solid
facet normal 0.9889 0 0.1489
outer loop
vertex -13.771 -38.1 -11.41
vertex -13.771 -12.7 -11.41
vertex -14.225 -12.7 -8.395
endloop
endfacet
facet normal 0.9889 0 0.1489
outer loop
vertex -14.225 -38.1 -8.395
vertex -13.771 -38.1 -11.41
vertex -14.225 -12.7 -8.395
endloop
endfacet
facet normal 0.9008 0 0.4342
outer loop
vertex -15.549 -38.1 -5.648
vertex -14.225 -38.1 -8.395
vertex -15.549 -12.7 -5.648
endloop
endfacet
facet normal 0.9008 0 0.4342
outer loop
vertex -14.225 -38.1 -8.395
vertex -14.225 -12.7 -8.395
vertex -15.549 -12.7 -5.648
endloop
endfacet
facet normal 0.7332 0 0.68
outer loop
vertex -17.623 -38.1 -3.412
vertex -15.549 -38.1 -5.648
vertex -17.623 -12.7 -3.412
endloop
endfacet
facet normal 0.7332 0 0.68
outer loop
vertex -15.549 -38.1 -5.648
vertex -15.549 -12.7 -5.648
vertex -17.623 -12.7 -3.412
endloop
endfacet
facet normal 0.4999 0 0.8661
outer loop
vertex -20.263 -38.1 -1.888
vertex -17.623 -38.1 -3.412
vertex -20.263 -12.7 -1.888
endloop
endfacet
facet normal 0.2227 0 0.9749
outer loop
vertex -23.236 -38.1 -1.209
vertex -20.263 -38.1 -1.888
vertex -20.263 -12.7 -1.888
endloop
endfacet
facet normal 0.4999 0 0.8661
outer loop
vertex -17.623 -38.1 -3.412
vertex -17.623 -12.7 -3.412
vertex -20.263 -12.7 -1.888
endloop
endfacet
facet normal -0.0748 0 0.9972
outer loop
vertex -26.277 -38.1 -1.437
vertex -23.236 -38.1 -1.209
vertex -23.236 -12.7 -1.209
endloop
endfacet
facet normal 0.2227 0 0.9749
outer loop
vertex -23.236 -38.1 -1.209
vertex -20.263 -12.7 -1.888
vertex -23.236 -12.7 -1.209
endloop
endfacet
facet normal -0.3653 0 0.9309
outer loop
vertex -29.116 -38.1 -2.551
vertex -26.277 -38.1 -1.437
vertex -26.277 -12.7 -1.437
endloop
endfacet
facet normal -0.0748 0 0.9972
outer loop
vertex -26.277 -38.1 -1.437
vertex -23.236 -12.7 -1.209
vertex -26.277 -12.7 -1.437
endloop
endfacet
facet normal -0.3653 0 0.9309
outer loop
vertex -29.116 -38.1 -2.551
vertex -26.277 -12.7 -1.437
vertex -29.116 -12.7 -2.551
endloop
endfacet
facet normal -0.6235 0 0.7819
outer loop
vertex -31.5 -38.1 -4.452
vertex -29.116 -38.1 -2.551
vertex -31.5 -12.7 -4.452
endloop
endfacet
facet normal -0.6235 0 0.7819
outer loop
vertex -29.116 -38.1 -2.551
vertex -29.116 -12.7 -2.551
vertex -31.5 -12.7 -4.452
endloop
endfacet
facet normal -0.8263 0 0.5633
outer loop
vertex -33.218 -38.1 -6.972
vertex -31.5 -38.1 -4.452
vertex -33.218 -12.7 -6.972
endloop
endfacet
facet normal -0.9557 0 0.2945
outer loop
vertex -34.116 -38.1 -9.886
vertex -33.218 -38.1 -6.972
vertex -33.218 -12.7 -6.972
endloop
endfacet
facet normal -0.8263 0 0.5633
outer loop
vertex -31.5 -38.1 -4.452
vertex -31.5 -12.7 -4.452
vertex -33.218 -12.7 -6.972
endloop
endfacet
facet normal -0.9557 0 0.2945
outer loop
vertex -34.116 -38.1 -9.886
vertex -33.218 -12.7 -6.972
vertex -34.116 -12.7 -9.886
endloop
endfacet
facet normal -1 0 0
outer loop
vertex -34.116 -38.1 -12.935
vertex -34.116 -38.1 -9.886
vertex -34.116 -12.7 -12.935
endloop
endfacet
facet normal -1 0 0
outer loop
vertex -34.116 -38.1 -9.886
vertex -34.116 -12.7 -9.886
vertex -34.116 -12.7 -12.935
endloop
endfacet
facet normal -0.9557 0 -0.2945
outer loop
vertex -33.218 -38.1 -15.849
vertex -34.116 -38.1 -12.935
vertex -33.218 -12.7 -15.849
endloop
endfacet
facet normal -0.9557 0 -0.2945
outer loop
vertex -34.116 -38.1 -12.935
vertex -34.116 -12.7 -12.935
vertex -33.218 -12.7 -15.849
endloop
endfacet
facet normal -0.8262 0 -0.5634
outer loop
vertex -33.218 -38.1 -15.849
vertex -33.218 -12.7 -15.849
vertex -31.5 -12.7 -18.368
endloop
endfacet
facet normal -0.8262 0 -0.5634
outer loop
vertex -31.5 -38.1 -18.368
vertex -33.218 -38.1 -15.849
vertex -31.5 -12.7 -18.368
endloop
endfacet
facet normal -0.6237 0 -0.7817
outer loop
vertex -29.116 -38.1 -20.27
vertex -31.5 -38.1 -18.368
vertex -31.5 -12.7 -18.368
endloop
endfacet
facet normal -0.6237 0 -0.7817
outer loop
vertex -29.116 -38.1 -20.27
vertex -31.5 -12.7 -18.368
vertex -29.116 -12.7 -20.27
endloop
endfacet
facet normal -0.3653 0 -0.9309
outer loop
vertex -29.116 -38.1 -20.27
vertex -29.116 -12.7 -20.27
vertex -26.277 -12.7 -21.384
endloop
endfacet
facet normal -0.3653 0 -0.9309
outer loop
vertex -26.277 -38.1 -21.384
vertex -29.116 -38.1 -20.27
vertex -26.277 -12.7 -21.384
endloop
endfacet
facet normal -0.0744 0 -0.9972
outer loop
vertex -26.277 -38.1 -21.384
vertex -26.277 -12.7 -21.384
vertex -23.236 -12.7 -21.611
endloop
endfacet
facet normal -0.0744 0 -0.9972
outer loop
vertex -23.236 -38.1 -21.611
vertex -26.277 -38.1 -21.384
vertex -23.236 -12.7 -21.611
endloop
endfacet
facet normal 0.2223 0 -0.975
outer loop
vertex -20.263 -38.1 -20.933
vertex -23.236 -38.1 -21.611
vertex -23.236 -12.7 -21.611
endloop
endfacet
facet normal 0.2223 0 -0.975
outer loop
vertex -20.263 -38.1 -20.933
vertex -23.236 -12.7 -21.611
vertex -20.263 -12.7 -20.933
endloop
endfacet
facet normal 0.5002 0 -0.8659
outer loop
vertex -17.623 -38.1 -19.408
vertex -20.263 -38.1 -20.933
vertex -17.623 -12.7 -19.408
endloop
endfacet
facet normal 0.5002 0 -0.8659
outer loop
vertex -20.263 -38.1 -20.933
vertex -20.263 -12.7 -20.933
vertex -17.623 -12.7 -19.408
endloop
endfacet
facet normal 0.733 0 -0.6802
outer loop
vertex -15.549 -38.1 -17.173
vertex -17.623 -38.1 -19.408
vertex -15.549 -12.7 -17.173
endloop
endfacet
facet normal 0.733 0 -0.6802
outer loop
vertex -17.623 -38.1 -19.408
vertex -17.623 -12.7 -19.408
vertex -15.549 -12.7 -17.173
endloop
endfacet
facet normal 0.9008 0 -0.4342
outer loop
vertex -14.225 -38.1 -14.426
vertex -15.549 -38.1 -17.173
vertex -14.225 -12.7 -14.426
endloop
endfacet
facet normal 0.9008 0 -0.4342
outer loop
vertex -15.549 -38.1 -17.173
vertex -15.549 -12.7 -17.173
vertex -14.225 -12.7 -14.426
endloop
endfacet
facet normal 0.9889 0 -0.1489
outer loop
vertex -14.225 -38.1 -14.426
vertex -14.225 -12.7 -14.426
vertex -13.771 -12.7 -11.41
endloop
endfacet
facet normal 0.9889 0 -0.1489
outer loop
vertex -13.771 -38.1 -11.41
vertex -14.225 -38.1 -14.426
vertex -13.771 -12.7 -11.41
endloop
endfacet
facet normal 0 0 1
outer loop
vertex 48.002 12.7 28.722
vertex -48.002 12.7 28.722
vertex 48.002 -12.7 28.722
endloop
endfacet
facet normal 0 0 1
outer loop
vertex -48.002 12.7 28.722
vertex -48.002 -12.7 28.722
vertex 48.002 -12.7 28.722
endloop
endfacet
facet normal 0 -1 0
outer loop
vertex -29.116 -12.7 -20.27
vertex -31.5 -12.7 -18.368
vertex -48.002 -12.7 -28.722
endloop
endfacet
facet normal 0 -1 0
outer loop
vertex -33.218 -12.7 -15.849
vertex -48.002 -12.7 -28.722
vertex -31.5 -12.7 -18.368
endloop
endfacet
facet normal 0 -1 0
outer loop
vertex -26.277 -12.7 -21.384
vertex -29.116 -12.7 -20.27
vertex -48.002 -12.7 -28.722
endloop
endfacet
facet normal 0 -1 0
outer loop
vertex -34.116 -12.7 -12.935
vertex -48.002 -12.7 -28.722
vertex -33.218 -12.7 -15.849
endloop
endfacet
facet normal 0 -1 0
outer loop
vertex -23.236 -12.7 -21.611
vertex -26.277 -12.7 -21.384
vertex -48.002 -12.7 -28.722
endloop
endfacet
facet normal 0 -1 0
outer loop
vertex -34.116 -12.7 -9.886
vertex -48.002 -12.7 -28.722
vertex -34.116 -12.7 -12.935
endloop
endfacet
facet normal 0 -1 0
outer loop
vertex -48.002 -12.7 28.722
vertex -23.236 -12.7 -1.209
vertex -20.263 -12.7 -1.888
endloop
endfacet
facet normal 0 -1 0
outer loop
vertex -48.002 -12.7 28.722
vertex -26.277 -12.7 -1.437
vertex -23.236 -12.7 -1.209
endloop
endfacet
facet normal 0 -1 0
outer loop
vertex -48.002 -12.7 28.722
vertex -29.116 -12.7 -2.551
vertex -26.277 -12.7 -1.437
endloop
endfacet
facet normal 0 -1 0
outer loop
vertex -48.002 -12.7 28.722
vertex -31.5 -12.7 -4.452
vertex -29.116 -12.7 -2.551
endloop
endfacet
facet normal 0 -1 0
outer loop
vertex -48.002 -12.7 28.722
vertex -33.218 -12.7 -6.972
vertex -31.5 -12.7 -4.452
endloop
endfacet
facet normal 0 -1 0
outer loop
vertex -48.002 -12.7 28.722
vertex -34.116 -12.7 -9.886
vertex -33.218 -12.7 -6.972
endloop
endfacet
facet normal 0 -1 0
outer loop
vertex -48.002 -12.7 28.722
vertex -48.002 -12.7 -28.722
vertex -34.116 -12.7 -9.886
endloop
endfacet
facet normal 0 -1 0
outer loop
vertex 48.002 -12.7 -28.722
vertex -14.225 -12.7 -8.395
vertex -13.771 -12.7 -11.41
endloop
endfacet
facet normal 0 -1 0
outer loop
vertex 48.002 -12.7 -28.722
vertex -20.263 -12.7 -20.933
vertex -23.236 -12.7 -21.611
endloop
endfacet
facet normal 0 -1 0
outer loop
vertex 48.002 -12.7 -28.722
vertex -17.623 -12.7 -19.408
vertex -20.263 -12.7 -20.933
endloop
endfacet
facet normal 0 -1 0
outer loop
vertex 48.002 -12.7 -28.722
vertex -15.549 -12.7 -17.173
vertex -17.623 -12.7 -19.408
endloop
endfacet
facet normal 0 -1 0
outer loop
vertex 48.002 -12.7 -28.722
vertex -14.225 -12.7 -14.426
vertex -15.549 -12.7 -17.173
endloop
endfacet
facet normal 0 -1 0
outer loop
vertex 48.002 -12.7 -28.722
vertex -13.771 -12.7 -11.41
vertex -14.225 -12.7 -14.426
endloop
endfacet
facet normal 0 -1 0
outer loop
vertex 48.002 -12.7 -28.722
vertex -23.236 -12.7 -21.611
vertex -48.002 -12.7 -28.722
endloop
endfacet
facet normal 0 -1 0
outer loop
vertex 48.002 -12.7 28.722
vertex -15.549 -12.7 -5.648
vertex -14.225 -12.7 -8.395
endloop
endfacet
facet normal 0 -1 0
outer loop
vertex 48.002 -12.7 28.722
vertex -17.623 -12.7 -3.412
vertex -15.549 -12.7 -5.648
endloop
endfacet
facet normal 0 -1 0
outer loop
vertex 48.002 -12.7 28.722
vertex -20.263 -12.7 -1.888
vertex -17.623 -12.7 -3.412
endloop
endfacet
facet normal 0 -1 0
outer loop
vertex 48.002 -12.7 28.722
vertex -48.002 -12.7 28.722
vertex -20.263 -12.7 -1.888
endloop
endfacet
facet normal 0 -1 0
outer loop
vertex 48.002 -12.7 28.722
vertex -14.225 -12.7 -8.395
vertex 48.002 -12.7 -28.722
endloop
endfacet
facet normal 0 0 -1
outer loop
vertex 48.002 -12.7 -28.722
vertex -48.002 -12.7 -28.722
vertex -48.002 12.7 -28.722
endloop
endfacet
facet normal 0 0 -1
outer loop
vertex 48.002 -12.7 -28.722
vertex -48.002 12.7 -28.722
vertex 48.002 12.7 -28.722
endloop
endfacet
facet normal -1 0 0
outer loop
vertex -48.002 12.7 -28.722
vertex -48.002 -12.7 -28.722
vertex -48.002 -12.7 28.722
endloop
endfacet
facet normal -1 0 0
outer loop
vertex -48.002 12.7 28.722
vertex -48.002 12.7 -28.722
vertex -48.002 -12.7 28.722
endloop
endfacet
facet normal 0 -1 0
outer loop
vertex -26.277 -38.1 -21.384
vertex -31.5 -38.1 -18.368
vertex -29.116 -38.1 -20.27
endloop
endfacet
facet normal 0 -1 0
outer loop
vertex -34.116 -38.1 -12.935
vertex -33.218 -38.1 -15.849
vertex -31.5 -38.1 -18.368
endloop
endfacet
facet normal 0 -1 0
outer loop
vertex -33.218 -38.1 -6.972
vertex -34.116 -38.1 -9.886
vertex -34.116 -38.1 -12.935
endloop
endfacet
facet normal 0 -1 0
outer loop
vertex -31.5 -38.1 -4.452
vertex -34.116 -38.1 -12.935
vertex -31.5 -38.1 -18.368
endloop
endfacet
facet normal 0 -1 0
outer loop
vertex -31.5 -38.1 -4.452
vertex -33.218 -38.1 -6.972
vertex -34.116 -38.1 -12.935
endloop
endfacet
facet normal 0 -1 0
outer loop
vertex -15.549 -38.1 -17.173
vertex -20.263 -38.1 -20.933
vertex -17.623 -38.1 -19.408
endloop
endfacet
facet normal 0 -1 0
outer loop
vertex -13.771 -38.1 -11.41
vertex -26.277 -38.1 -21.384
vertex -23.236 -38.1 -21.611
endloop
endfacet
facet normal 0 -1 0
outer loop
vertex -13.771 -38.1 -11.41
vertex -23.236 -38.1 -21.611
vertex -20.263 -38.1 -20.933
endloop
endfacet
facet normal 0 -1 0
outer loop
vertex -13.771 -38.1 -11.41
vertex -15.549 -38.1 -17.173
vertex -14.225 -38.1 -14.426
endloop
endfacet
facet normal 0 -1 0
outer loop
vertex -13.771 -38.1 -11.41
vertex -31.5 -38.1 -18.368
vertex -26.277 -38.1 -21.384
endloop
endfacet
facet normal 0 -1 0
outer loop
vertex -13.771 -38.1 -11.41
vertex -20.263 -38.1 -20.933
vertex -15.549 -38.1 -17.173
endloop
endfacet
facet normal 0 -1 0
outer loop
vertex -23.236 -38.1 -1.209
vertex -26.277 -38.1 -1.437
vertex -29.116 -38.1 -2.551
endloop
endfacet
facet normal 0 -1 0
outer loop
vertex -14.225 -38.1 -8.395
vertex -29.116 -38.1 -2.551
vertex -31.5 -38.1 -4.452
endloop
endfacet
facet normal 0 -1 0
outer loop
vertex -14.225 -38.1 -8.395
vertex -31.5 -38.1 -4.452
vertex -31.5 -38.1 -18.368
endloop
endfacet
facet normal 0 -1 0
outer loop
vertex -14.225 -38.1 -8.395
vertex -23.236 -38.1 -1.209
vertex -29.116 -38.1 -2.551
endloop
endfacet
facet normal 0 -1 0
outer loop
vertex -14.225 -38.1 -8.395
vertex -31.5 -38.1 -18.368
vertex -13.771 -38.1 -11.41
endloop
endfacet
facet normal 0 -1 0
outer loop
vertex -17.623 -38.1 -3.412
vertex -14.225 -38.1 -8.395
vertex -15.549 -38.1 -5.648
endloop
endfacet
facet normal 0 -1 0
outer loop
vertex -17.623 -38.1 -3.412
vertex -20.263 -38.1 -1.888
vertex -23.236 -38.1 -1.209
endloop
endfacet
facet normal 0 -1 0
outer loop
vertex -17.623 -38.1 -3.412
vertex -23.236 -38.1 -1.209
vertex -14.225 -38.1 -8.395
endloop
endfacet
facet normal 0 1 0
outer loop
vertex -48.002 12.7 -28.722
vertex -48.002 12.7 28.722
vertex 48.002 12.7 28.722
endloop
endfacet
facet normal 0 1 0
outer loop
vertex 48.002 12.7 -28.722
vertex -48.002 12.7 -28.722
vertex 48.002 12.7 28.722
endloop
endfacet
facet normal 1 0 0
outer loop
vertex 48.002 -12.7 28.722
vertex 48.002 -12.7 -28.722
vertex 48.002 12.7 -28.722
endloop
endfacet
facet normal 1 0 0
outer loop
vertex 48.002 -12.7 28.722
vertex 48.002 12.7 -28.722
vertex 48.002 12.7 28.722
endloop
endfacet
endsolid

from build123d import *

# Parameters (mm, degrees)
F0_W     = 96.003198
F0_H     = 57.444536
F1_DEPTH = 12.7
F2_R     = 10.229848
F3_DEPTH = 25.4


with BuildPart() as f1:
    # F0 (on Front) → F1 (new body, symmetric)
    with BuildSketch(Plane.XZ):
        Rectangle(F0_W, F0_H)
    extrude(amount=F1_DEPTH, both=True)

    # F2 (on face) → F3 (join)
    with BuildSketch(Plane.XZ.offset(12.7)):
        with Locations((-24.000801, -11.410213)):
            Circle(F2_R)
    extrude(amount=F3_DEPTH)


solid = f1.part
